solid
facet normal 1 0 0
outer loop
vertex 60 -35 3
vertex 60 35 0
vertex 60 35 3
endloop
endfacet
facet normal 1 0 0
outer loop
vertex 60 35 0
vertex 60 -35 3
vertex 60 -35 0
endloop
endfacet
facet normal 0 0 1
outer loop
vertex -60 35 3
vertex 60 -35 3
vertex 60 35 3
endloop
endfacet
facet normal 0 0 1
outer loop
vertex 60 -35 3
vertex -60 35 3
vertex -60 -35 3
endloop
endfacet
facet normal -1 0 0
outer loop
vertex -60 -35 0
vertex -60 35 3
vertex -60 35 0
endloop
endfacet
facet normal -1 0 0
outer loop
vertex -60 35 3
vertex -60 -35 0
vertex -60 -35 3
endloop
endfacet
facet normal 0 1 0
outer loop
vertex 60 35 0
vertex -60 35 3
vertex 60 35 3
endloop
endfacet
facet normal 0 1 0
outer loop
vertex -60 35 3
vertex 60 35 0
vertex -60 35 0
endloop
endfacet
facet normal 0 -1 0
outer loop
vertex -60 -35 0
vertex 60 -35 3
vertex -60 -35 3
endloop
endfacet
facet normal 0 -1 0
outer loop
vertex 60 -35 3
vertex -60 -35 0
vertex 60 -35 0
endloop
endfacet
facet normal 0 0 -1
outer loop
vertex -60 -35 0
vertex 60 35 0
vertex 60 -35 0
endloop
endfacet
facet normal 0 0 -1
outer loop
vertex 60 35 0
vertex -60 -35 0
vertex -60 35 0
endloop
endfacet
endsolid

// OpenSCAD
// Built by bench/smallmodels/features/compiler.py from a list of features.
$fn = 64;
difference() {
  union() {
    translate([0, 0, 0]) translate([-60, -35, 0]) cube([120, 70, 40]);
  }
  union() {
    translate([0, 0, 3]) rotate([0, 0, 0]) translate([-60, -35, 0]) cube([120, 70, 37]);
    translate([-10, 0, 13]) rotate([0, 0, 0]) translate([-50, -37, 0]) cube([100, 74, 5]);
  }
}
